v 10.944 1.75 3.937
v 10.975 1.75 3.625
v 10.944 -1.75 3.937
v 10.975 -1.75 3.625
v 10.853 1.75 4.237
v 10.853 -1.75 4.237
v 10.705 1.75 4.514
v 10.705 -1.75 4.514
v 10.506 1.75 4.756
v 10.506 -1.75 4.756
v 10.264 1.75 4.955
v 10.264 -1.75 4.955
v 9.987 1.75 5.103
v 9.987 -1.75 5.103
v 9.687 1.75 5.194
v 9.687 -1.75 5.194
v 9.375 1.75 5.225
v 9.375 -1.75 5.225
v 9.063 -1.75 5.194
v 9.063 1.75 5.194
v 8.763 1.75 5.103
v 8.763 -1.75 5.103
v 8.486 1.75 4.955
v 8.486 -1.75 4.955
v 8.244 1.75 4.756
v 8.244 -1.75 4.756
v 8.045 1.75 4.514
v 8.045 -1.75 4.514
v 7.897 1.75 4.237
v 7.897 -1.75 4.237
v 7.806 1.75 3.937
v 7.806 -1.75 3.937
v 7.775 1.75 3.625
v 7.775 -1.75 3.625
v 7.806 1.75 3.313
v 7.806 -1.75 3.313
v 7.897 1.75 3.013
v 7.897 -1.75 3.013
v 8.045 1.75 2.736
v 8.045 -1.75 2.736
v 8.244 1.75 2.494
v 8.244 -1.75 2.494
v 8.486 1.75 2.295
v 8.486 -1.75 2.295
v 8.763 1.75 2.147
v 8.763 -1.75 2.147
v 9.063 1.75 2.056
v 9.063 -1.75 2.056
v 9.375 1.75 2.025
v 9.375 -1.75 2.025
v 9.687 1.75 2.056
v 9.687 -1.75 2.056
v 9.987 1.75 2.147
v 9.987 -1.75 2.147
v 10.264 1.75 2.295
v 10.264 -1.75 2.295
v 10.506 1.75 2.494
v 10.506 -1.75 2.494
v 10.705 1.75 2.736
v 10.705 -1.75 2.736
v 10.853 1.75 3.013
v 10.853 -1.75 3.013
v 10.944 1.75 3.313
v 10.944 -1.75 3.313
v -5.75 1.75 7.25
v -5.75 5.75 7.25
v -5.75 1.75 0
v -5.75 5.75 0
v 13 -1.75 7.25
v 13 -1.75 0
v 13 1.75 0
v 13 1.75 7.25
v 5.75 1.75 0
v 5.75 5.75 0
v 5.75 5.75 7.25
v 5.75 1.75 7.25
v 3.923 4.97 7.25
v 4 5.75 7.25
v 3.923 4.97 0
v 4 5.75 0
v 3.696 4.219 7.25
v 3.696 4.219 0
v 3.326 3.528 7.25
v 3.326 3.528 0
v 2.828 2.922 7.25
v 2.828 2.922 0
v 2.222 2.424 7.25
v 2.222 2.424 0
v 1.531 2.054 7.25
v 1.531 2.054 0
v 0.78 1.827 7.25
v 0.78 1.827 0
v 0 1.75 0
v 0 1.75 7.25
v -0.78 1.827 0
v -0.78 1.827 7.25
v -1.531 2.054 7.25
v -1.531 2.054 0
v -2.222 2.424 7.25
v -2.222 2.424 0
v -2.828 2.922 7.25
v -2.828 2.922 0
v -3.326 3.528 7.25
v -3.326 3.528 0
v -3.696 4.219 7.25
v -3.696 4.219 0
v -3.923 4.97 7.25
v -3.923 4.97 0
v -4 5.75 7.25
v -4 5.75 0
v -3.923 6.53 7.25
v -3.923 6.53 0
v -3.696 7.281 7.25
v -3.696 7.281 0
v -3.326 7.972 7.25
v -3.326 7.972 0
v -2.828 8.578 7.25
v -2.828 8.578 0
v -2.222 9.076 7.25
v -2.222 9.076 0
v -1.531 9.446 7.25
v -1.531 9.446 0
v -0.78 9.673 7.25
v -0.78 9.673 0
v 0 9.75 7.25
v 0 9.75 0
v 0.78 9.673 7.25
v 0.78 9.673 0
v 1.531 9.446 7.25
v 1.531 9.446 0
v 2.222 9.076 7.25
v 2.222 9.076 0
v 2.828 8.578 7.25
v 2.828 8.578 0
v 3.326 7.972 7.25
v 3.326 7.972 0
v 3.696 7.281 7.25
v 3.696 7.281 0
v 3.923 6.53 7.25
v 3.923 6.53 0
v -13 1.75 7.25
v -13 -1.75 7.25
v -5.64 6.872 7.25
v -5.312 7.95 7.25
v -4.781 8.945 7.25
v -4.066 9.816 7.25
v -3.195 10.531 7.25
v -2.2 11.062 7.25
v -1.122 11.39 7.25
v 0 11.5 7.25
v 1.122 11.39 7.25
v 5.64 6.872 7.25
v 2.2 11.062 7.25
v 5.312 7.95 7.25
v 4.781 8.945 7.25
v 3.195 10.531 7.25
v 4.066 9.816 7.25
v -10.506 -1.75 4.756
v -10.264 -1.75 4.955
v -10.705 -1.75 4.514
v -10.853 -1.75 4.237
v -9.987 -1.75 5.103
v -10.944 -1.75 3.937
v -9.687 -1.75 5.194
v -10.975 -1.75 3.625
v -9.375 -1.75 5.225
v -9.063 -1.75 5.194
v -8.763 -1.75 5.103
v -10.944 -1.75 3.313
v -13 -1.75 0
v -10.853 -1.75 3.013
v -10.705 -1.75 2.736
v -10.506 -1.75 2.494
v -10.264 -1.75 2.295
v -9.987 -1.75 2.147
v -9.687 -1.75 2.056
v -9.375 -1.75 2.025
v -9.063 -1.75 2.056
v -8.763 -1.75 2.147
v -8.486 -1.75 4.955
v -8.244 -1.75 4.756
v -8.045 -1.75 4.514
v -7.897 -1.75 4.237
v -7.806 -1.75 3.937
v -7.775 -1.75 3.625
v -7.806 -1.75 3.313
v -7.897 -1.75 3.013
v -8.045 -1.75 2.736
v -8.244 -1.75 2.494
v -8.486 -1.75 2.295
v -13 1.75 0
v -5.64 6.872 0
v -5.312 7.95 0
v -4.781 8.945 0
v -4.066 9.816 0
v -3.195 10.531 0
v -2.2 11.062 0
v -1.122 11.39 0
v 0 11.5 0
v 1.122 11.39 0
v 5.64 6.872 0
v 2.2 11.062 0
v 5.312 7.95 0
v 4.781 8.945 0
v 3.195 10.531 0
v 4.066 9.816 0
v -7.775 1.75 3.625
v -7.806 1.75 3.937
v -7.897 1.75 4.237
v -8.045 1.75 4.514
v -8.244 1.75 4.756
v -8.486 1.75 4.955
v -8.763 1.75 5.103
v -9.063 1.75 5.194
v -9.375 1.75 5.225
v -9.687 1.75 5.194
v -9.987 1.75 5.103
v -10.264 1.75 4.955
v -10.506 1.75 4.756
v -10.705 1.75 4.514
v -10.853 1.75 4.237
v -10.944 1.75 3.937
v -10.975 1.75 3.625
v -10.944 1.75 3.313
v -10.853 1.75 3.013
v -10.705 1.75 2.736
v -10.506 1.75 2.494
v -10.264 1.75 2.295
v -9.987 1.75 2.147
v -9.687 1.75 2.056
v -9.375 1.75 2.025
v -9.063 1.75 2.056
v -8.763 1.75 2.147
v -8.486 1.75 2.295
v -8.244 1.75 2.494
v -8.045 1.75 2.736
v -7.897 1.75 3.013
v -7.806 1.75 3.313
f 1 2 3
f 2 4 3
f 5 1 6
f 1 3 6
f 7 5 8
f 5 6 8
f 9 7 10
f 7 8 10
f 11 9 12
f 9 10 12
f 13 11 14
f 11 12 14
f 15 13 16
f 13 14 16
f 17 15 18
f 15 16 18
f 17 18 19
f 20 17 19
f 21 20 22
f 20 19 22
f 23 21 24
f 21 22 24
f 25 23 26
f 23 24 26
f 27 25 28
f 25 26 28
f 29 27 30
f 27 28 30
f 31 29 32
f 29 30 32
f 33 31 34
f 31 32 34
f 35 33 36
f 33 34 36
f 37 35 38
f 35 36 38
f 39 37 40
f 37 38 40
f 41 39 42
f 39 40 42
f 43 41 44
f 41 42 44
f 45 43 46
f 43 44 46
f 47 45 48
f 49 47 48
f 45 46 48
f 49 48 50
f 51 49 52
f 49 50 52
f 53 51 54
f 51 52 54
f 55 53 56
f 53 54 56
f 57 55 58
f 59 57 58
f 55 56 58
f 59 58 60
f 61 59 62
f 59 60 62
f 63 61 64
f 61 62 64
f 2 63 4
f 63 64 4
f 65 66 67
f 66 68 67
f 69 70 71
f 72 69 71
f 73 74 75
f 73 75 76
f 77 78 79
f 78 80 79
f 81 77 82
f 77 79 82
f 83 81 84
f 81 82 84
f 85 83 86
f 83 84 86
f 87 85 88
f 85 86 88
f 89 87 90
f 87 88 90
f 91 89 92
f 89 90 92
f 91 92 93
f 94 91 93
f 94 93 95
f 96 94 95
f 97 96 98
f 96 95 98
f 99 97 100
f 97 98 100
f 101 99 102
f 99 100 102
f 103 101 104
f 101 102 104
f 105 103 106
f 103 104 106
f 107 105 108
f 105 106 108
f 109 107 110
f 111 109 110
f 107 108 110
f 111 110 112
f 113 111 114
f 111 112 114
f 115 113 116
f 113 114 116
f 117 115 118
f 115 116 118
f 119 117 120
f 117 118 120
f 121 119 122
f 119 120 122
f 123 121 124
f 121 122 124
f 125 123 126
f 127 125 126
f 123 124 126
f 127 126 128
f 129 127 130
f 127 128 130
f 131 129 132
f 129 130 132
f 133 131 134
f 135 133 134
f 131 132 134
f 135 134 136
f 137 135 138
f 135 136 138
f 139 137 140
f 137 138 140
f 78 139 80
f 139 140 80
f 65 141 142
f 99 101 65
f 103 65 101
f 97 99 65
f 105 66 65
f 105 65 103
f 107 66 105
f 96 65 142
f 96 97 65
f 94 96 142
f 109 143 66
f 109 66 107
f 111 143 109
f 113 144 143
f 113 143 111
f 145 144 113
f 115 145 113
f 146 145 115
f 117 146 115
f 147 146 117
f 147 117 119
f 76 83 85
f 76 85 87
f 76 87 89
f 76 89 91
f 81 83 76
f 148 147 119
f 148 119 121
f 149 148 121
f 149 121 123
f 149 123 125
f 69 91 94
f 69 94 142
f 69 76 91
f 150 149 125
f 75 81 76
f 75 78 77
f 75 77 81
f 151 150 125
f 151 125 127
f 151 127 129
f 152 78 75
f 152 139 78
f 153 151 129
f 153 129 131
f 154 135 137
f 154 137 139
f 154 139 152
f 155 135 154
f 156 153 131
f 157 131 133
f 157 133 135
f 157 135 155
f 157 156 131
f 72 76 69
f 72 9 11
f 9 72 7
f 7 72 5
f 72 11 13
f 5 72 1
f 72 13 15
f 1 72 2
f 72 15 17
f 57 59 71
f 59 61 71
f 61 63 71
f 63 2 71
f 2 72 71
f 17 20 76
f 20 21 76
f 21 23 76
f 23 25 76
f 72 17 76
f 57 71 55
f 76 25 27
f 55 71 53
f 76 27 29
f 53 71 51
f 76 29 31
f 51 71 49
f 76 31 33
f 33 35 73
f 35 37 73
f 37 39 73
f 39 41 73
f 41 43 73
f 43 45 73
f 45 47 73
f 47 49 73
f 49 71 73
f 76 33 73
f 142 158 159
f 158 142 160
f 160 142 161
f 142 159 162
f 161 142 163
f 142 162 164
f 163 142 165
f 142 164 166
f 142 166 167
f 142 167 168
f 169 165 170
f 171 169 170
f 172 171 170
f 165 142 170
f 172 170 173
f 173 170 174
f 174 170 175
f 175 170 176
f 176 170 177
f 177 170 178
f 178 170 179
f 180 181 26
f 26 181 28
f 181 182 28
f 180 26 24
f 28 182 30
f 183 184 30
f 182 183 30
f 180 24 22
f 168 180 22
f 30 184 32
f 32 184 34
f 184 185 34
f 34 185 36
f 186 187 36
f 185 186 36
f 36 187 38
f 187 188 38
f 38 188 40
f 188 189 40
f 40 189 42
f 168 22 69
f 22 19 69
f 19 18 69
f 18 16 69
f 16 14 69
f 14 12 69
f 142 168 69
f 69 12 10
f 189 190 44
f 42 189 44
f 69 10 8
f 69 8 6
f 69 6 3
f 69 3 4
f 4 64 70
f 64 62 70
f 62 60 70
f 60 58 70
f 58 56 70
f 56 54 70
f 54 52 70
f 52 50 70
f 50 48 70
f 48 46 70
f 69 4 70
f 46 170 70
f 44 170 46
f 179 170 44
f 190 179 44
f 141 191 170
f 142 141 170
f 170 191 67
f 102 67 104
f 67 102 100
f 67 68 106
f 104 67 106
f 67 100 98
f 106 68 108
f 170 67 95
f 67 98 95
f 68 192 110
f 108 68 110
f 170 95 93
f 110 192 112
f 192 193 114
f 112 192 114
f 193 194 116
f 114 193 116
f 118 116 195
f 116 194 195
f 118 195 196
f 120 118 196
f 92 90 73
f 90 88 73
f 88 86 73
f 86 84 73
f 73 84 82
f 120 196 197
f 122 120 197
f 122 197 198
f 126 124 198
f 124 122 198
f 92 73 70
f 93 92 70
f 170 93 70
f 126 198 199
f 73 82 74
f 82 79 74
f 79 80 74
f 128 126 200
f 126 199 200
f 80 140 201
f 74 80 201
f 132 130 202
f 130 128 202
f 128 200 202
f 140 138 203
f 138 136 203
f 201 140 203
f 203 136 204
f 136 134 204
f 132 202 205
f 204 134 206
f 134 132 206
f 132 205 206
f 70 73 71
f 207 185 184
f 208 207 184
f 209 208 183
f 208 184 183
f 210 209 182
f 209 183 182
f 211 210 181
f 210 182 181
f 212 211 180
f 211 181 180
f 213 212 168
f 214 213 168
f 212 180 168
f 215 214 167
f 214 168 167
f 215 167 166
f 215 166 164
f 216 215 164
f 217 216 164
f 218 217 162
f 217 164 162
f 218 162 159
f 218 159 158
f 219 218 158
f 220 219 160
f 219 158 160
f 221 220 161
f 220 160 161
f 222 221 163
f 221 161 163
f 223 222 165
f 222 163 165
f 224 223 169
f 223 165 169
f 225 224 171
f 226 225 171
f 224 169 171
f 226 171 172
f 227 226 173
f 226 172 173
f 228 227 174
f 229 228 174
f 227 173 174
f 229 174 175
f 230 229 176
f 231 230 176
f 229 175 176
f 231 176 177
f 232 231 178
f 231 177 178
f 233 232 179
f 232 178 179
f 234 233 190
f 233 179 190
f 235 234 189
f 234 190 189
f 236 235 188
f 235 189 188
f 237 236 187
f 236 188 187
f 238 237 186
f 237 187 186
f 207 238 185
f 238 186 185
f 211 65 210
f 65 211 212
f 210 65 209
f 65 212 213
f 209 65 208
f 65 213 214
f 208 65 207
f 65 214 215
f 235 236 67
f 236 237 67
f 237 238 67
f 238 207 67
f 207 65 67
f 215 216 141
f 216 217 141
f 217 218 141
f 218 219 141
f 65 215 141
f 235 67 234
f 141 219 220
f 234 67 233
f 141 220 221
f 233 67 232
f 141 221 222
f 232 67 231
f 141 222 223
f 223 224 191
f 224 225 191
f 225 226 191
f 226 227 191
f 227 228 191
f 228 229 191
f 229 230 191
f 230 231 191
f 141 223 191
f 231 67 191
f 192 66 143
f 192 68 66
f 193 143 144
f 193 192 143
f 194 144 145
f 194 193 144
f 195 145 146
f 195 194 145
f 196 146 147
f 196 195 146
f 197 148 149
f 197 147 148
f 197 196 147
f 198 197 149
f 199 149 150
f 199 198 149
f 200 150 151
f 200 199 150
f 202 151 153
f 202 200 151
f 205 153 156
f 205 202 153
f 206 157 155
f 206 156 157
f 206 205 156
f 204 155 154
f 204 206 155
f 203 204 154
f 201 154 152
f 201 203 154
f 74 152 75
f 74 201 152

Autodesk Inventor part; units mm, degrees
ref_plane "YZ Plane" through (0, 0, 0) normal (1, 0, 0) x (0, 1, 0)
ref_plane "XZ Plane" through (0, 0, 0) normal (0, 1, 0) x (-1, 0, 0)
ref_plane "XY Plane" through (0, 0, 0) normal (0, 0, 1) x (1, 0, 0)
sketch "Sketch1" plane through (0, 0, 0) normal (0, 0, 1) x (1, 0, 0)
  line L0 (-13, -1.75) -> (13, -1.75)
  line L1 (13, -1.75) -> (13, 1.75)
  line L2 (13, 1.75) -> (-13, 1.75)
  line L3 (-13, 1.75) -> (-13, -1.75)
  line L4 (-13, -1.75) -> (13, 1.75) construction
  line L5 (13, -1.75) -> (-13, 1.75) construction
  line L6 (0, 1.75) -> (0, 5.75)
  circle A0 centre (0, 5.75) radius 4
  circle A1 centre (0, 5.75) radius 5.75
  line L7 (-5.75, 5.75) -> (-5.75, 1.75)
  line L8 (5.75, 5.75) -> (5.75, 1.75)
  point P0 (0, 0)
  dimension "d0" = 26
  dimension "d1" = 3.5
  dimension "d2" = 4
  dimension "d3" = 8
  dimension "d4" = 11.5
extrude "Extrusion1" add sketch "Sketch1" along normal blind 7.25
sketch "Sketch2" plane through (-13, -1.75, 0) normal (0, -1, 0) x (1, 0, 0)
  line L0 (13, 0) -> (13, 7.25)
  line L1 (9, 7.25) -> (17, 7.25) projected
  line L2 (13, 3.625) -> (22.375, 3.625)
  line L3 (22.375, 3.625) -> (3.625, 3.625)
  circle A0 centre (22.375, 3.625) radius 1.6
  circle A1 centre (3.625, 3.625) radius 1.6
  dimension "d7" = 9.375
  dimension "d8" = 18.75
  dimension "d9" = 3.2
  dimension "d10" = 3.2
extrude "Extrusion2" cut sketch "Sketch2" against normal blind 7.25
properties part number "Mauch_Power_Button_Bracket" material "ABS Plastic"
